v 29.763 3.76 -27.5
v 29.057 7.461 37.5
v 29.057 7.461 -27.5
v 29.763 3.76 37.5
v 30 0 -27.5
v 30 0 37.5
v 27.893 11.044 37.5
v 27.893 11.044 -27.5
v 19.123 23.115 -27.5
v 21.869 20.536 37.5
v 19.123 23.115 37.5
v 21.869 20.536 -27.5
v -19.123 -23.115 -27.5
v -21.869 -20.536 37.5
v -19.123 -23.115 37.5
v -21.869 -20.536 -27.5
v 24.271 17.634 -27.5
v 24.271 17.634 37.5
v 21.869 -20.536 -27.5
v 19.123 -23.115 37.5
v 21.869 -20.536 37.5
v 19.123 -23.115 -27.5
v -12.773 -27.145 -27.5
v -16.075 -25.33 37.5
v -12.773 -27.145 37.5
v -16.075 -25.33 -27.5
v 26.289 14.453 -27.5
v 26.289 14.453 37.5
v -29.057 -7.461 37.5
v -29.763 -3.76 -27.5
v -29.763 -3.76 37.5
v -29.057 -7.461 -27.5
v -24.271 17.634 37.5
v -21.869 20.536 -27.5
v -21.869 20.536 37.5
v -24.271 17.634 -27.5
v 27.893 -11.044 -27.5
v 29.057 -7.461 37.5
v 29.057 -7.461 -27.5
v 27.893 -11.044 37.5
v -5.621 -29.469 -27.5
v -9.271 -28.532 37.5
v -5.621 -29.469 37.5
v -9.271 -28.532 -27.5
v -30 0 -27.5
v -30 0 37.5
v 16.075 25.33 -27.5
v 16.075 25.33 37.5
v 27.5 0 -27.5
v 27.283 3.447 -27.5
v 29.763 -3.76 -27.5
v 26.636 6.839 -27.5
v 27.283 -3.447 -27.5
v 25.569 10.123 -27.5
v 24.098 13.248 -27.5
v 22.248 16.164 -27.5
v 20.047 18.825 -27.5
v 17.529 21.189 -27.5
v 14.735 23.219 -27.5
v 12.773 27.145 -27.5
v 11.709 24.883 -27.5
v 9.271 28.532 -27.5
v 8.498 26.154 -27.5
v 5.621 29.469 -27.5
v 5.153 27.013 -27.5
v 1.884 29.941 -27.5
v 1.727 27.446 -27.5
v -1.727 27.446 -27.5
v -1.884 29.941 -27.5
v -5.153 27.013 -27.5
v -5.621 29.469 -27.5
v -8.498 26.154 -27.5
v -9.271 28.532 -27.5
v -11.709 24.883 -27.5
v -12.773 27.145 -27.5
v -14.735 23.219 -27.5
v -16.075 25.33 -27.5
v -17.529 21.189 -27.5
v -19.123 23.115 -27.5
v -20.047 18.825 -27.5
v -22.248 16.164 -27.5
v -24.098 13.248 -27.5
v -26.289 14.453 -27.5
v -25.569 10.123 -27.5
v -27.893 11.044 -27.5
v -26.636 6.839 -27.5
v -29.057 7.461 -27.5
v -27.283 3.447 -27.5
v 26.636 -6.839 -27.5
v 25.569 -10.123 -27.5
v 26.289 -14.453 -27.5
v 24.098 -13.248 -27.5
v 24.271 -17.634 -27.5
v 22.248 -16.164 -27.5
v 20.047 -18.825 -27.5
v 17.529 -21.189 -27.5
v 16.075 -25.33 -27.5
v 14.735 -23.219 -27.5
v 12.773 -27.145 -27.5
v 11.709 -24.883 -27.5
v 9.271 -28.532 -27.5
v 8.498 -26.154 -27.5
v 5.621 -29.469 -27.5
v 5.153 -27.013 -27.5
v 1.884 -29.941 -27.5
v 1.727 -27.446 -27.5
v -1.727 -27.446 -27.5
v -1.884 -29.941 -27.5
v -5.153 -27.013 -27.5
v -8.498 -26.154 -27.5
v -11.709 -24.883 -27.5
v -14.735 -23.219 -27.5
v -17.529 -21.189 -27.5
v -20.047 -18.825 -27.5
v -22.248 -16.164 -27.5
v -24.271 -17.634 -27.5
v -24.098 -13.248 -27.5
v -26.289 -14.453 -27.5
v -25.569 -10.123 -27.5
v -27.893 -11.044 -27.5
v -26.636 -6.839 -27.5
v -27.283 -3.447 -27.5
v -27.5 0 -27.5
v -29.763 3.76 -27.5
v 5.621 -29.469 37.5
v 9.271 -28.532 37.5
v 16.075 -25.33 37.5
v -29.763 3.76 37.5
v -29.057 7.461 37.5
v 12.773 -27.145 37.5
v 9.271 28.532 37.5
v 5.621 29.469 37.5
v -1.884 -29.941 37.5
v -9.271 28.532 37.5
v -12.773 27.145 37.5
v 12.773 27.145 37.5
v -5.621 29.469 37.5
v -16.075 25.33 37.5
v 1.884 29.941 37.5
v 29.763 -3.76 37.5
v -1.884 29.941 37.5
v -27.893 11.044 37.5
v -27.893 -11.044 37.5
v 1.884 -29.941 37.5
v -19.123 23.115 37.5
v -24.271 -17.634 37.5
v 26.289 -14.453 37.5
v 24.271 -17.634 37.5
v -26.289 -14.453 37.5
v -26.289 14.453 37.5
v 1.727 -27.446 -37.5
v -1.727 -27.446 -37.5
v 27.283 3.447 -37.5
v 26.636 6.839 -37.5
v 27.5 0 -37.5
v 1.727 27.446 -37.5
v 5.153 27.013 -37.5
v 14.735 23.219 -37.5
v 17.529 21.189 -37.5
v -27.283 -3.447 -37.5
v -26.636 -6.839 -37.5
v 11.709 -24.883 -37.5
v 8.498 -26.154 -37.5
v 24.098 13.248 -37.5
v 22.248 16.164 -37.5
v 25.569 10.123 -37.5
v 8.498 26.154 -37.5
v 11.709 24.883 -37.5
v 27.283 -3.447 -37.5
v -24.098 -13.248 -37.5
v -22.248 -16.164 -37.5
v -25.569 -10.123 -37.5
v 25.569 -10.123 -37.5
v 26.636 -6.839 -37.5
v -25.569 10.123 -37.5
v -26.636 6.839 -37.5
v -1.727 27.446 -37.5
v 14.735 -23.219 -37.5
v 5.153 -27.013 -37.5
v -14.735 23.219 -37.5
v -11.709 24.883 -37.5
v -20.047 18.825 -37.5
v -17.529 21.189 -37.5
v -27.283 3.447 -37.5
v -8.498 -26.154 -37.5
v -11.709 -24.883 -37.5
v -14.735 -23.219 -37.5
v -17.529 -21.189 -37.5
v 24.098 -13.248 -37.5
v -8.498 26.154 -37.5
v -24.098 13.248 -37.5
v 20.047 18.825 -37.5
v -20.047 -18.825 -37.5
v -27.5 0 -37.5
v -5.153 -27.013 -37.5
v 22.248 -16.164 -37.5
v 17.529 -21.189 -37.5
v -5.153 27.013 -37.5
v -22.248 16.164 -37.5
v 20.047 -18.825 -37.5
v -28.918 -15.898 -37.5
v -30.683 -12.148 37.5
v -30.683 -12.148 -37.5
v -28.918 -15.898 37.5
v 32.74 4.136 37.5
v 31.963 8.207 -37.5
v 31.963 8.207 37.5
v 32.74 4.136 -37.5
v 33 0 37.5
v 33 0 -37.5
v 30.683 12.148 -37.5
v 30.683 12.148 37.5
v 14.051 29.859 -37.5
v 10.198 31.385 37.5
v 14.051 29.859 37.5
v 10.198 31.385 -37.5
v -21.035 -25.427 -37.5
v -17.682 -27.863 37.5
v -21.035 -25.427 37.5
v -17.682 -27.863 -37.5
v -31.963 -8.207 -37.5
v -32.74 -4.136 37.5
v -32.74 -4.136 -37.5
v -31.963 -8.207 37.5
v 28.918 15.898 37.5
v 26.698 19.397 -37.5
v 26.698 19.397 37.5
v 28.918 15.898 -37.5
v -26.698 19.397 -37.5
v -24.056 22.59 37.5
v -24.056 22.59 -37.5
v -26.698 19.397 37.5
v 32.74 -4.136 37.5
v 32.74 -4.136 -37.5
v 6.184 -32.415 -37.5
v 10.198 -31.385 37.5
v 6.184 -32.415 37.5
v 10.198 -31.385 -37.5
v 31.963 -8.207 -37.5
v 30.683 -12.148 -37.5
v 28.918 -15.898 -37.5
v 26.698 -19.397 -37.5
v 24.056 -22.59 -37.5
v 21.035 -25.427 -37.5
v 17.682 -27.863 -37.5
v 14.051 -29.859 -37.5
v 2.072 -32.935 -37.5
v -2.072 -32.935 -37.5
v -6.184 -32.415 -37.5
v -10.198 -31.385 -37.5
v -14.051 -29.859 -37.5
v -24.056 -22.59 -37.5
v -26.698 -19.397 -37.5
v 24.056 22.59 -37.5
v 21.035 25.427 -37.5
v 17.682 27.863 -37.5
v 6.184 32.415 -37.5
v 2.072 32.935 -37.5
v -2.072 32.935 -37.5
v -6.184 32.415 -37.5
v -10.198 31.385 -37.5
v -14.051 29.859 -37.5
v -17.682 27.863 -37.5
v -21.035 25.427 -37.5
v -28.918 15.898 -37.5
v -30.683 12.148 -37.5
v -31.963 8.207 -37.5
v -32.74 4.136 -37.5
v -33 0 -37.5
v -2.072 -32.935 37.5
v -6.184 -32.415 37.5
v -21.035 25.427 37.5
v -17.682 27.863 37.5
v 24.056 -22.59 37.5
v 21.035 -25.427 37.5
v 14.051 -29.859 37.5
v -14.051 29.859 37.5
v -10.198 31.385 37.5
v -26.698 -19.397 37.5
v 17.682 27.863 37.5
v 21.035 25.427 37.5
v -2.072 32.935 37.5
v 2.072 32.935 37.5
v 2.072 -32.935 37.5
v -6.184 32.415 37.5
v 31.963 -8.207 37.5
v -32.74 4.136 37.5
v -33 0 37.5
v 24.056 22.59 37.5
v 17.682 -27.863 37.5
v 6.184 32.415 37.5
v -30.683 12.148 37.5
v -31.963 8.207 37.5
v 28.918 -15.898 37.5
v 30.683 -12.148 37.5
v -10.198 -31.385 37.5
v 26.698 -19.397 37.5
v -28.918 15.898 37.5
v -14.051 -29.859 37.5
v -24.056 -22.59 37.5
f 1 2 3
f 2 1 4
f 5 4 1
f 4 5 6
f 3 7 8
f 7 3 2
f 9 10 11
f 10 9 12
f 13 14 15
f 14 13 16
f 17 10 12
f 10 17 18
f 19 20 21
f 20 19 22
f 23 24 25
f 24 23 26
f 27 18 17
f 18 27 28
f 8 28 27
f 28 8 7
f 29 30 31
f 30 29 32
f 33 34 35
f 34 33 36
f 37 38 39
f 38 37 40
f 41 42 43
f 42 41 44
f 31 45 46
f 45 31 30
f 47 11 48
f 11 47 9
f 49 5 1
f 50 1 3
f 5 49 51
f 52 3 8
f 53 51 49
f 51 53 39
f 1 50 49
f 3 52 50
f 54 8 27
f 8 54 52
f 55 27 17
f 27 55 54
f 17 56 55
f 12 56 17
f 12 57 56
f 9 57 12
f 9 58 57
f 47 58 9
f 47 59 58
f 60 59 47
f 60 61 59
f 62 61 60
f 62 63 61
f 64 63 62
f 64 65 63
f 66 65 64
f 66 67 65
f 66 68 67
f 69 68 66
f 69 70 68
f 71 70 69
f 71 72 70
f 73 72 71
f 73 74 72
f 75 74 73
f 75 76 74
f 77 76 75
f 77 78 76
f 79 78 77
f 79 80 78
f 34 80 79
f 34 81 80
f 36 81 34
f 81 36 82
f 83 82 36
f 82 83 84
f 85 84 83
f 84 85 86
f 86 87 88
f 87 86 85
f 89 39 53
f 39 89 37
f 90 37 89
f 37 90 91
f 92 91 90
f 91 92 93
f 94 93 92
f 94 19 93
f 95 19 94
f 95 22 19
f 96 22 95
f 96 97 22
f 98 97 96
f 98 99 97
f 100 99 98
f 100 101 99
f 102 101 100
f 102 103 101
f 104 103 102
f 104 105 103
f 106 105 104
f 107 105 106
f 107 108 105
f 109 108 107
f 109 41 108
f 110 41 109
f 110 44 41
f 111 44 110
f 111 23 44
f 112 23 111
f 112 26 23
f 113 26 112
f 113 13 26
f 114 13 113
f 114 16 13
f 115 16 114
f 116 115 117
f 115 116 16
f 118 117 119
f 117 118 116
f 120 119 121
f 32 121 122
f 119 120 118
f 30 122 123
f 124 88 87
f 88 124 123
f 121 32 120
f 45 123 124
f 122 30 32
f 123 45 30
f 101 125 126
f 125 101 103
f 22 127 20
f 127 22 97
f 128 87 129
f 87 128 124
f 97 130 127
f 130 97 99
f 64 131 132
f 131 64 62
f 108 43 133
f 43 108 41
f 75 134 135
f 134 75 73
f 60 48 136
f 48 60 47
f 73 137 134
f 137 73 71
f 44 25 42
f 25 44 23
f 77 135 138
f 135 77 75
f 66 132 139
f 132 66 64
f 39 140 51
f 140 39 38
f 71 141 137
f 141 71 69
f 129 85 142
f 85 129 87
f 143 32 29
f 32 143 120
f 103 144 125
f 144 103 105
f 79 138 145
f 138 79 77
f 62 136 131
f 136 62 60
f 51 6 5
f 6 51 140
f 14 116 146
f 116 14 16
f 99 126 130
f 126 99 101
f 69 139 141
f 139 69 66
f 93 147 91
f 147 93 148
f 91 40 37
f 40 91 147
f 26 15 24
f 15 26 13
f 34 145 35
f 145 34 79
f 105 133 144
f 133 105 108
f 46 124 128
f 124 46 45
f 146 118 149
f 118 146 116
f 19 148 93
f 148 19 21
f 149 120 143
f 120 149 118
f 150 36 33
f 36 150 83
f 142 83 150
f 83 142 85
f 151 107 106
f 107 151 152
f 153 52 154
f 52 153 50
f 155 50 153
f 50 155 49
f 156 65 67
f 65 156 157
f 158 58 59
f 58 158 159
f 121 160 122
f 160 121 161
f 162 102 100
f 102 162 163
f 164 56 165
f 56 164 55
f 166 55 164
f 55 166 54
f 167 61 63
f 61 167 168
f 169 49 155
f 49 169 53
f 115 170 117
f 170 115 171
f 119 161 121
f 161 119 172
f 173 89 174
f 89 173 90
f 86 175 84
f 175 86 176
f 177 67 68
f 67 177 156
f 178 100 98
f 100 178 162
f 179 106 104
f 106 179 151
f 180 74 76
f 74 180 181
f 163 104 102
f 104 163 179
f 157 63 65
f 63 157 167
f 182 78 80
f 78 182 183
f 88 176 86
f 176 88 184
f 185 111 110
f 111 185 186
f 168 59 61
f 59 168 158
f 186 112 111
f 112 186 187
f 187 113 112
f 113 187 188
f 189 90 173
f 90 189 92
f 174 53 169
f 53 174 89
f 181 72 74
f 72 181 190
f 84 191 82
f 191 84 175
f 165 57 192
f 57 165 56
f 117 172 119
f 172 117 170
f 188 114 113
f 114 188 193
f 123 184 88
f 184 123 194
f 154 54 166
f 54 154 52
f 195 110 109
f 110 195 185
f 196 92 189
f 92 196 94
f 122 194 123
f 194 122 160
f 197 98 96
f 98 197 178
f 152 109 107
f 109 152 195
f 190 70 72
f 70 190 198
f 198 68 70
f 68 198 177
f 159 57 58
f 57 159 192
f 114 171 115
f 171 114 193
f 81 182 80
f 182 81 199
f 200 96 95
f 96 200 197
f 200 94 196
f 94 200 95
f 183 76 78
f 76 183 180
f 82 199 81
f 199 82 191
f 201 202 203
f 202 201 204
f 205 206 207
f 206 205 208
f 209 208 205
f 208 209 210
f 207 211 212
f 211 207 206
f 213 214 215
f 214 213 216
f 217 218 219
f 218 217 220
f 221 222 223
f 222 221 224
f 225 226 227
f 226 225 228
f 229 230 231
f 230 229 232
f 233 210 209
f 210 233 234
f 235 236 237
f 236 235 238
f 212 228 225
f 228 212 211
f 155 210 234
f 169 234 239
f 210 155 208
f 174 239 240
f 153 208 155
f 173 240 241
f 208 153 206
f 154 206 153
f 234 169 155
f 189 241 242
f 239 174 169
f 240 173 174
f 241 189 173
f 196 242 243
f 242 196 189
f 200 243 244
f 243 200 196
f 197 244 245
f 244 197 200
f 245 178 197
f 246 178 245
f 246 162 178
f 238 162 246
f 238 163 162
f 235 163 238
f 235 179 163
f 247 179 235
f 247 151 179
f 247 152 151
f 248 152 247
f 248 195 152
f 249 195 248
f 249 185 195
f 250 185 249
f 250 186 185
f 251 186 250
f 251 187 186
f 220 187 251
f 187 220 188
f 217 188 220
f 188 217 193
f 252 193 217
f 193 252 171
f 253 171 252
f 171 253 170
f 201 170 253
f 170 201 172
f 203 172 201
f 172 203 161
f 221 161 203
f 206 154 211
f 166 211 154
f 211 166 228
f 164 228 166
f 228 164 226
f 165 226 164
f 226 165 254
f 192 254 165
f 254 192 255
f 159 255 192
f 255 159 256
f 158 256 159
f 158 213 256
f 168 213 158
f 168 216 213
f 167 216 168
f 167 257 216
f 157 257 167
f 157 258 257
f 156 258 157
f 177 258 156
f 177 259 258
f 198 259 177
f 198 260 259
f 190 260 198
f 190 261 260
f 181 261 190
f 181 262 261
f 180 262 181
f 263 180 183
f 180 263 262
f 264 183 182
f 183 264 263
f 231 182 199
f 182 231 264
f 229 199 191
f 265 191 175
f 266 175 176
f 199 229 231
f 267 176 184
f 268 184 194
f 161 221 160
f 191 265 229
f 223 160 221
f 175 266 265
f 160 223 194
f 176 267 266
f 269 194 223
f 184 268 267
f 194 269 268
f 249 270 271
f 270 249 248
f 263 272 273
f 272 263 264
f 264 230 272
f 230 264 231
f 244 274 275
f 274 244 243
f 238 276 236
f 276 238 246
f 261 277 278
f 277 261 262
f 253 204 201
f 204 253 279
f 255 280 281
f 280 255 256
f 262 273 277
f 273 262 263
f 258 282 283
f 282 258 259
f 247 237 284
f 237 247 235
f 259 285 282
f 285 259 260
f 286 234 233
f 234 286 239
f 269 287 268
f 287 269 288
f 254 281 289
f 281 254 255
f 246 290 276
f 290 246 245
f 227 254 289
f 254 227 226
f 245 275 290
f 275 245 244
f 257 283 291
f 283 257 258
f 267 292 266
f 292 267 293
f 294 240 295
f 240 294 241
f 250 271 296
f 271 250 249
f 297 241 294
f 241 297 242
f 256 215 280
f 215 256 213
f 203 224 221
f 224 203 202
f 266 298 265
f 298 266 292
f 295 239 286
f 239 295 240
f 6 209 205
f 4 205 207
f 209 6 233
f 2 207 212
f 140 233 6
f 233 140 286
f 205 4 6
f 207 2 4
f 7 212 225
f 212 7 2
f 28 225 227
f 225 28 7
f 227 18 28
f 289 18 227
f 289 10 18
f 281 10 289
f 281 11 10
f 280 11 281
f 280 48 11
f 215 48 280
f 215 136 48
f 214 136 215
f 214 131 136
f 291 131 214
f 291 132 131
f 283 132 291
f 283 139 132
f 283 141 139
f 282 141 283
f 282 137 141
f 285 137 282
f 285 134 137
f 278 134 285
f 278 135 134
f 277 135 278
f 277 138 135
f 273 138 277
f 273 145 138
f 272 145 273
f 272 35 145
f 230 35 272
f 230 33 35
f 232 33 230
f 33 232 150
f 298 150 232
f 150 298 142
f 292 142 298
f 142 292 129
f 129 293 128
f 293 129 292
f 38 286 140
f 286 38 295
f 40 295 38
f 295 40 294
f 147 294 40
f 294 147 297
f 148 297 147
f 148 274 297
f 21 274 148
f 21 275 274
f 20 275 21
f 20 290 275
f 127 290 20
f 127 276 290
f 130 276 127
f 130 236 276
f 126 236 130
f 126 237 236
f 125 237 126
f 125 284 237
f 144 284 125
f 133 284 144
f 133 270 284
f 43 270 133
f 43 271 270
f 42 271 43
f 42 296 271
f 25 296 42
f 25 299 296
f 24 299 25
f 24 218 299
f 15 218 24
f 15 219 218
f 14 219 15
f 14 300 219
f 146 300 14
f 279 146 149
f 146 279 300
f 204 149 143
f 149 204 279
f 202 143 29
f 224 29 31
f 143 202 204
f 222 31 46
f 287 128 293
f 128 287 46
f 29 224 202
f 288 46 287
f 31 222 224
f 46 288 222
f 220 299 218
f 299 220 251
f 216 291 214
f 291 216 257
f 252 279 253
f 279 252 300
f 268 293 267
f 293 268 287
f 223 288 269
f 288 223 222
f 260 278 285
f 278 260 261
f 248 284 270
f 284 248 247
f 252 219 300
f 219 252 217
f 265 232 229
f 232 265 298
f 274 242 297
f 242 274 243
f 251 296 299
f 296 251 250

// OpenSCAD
union () {
	difference () {
		union(){
			cylinder(r=33, h=75, center=true, $fn=50); 
		}
		difference() {
			union() {
				translate([0,0,10])  cylinder(r=60/2, h=75, center=true, $fn=50); 
				translate([0,0,-50])  cylinder(r=55/2, h=75, center=true, $fn=50); 
			}        
		}
	}
}
